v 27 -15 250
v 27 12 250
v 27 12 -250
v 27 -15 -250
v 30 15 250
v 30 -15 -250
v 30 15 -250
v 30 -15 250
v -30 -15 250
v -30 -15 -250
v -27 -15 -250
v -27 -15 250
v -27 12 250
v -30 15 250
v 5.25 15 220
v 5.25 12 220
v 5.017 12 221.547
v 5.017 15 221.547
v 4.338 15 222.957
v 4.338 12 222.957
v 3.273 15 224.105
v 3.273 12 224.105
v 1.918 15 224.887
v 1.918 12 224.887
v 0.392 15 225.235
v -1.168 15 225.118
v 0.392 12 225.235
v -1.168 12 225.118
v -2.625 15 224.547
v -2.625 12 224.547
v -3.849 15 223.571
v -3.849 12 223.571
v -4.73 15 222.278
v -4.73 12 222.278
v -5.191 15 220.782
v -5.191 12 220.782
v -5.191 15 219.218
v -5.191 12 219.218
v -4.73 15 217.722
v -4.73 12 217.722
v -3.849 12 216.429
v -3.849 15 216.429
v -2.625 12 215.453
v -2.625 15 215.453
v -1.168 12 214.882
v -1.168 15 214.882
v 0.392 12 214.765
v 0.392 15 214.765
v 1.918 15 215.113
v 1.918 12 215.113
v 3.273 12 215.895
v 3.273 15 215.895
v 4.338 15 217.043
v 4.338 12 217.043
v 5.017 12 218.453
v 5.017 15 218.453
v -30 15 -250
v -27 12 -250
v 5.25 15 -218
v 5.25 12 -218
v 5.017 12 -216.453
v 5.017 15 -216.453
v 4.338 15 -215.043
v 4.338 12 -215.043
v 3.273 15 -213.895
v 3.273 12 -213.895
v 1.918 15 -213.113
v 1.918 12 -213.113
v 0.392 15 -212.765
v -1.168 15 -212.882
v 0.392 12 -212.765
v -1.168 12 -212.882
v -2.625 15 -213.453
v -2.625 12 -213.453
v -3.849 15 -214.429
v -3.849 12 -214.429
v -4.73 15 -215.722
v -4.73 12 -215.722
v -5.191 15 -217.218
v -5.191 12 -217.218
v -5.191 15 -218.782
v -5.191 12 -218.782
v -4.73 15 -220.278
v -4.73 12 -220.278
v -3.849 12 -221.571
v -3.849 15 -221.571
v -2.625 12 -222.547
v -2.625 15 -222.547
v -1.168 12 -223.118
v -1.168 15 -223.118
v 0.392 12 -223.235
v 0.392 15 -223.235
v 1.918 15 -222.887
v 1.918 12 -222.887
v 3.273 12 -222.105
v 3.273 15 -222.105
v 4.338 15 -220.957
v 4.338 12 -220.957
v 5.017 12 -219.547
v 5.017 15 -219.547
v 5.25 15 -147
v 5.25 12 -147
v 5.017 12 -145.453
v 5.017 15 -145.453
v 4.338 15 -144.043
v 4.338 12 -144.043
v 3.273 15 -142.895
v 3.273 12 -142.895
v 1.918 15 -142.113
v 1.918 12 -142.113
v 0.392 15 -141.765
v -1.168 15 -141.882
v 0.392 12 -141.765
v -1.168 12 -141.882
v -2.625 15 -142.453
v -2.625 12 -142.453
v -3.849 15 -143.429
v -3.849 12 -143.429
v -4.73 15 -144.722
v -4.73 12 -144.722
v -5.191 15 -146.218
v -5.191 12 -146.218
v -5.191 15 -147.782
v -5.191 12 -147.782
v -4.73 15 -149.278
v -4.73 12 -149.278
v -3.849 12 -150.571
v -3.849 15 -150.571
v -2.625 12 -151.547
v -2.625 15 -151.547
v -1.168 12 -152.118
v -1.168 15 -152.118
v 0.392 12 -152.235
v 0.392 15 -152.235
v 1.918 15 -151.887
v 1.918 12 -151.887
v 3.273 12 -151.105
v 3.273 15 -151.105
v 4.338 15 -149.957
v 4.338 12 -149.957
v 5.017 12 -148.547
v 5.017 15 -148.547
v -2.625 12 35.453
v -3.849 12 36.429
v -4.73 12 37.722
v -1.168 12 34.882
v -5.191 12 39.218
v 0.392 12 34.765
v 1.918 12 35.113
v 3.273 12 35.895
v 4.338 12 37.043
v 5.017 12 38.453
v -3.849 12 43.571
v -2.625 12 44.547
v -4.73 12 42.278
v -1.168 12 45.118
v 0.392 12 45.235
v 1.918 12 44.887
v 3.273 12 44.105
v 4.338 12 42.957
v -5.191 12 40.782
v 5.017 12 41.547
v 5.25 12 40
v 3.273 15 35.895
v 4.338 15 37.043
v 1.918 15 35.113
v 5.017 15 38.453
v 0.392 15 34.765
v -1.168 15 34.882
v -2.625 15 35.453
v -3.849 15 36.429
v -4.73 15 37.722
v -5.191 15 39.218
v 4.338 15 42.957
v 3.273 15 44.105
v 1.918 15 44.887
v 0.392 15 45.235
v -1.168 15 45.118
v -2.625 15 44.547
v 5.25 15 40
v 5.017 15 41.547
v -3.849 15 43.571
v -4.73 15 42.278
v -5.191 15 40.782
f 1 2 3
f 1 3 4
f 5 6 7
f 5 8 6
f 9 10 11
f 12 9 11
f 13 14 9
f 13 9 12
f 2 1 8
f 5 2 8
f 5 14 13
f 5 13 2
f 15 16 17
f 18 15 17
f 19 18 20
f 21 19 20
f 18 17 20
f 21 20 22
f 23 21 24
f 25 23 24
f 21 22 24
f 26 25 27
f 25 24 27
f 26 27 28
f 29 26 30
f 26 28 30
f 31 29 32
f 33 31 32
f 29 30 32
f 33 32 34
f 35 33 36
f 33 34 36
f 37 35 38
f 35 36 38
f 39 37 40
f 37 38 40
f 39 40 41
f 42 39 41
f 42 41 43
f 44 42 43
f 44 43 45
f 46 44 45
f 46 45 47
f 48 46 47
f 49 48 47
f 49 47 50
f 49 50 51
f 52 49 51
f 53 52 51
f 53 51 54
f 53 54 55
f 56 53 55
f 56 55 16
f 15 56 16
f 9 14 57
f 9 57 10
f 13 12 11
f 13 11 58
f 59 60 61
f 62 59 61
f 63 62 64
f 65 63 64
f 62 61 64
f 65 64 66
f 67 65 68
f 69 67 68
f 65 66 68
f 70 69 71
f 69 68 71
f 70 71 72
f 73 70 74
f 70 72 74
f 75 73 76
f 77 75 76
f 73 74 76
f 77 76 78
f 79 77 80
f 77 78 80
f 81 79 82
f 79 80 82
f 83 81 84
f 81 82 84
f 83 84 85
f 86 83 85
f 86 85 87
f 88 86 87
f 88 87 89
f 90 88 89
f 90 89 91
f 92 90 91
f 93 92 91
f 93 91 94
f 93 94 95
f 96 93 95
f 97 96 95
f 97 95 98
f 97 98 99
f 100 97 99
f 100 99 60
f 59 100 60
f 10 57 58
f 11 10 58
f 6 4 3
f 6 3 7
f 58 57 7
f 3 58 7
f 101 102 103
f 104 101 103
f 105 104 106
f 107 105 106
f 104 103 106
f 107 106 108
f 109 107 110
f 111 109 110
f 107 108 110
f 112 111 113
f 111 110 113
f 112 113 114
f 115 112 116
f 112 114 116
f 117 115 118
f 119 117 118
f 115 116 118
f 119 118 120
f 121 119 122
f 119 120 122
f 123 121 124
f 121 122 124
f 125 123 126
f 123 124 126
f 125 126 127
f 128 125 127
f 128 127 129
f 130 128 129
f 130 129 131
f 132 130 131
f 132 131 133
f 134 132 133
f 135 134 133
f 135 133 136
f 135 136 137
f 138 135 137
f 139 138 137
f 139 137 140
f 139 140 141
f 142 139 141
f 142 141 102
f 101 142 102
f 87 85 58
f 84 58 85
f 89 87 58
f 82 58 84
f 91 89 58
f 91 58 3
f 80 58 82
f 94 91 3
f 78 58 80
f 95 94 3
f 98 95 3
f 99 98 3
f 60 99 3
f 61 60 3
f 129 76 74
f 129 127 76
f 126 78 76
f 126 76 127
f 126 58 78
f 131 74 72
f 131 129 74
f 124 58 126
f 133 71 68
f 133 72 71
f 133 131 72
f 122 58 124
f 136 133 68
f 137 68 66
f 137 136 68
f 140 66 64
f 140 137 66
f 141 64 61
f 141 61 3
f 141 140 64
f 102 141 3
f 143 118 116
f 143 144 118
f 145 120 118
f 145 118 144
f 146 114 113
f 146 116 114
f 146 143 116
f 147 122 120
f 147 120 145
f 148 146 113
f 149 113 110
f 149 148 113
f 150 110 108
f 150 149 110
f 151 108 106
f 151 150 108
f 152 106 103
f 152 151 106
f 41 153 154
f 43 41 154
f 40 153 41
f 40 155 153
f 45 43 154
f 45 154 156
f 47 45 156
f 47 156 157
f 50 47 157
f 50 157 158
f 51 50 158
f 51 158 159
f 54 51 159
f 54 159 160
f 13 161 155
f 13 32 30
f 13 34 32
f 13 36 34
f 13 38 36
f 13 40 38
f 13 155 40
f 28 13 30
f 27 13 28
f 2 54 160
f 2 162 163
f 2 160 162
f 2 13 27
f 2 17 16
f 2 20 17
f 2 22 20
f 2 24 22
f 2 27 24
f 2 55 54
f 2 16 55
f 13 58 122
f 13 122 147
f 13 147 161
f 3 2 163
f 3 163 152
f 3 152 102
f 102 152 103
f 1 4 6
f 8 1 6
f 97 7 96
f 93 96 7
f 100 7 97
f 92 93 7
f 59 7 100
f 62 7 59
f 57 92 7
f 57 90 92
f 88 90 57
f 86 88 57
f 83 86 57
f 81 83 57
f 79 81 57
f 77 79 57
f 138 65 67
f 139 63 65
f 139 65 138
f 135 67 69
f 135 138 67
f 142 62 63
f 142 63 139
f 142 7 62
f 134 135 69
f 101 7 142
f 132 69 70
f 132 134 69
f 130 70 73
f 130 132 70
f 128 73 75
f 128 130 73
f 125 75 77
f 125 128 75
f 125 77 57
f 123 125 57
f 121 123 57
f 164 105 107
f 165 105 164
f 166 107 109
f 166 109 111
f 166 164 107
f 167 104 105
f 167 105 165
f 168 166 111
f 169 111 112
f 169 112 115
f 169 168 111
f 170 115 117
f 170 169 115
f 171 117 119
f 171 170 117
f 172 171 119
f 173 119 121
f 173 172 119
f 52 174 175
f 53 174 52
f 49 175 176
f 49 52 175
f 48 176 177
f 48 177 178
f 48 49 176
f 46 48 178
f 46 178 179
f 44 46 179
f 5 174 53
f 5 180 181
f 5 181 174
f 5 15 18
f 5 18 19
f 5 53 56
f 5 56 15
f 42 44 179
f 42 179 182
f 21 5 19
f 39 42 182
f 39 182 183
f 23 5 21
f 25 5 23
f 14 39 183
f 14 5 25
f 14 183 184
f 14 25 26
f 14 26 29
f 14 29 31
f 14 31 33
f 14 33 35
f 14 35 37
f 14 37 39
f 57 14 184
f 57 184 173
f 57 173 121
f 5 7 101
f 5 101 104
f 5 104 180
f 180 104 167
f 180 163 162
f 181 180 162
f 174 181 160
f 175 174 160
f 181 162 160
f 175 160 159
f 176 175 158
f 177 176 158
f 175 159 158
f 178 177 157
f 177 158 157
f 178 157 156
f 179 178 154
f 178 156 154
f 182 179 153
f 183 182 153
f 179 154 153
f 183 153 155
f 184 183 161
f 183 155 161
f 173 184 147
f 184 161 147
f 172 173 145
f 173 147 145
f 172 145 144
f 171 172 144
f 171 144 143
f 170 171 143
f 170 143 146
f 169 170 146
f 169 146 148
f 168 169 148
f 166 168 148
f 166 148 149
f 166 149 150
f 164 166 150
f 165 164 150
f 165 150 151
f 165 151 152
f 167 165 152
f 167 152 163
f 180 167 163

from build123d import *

# Parameters (mm, degrees)
F1_DEPTH = 250
F3_D     = 10.5
F5_D     = 10.5


with BuildPart() as f1:
    # F0 (on Top) → F1 (new body, symmetric)
    with BuildSketch(Plane.XY):
        Polygon((30, 15), (-30, 15), (-30, -15), (-27, -15), (-27, 12), (27, 12), (27, -15), (30, -15), align=None)
    extrude(amount=F1_DEPTH, both=True)

    # F3 (through all)
    with Locations(Plane(origin=(0, 15, 0), x_dir=(-1, 0, 0), z_dir=(0, 1, 0))):
        with Locations((0, -218), (0, -147)):
            Hole(F3_D / 2)

    # F5 (through all)
    with Locations(Plane(origin=(0, 15, 0), x_dir=(-1, 0, 0), z_dir=(0, 1, 0))):
        with Locations((0, 220), (0, 40)):
            Hole(F5_D / 2)


solid = f1.part
